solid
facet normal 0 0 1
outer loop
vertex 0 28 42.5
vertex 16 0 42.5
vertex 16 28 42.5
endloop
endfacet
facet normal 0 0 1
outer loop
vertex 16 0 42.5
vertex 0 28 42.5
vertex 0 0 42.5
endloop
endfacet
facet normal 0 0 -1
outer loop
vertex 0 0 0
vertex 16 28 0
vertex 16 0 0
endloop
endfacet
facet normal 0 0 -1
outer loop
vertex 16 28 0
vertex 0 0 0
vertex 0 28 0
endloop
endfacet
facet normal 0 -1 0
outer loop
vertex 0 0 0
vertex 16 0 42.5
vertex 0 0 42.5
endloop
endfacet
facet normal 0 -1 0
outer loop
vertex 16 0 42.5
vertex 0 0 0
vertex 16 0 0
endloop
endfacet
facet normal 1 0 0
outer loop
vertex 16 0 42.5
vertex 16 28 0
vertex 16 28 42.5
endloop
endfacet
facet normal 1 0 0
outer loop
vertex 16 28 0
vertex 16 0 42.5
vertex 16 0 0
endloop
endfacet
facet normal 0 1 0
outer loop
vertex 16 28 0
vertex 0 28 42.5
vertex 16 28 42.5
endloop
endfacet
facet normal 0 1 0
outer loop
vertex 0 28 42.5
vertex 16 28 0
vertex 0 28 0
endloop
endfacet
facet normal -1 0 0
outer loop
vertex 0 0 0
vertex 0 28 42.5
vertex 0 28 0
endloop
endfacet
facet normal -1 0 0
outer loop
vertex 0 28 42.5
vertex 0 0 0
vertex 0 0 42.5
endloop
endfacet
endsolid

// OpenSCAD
$fn = 64;

block_x = 16.0;
block_y = 28.0;
block_z = 42.5;

cube([block_x, block_y, block_z], center=false);
